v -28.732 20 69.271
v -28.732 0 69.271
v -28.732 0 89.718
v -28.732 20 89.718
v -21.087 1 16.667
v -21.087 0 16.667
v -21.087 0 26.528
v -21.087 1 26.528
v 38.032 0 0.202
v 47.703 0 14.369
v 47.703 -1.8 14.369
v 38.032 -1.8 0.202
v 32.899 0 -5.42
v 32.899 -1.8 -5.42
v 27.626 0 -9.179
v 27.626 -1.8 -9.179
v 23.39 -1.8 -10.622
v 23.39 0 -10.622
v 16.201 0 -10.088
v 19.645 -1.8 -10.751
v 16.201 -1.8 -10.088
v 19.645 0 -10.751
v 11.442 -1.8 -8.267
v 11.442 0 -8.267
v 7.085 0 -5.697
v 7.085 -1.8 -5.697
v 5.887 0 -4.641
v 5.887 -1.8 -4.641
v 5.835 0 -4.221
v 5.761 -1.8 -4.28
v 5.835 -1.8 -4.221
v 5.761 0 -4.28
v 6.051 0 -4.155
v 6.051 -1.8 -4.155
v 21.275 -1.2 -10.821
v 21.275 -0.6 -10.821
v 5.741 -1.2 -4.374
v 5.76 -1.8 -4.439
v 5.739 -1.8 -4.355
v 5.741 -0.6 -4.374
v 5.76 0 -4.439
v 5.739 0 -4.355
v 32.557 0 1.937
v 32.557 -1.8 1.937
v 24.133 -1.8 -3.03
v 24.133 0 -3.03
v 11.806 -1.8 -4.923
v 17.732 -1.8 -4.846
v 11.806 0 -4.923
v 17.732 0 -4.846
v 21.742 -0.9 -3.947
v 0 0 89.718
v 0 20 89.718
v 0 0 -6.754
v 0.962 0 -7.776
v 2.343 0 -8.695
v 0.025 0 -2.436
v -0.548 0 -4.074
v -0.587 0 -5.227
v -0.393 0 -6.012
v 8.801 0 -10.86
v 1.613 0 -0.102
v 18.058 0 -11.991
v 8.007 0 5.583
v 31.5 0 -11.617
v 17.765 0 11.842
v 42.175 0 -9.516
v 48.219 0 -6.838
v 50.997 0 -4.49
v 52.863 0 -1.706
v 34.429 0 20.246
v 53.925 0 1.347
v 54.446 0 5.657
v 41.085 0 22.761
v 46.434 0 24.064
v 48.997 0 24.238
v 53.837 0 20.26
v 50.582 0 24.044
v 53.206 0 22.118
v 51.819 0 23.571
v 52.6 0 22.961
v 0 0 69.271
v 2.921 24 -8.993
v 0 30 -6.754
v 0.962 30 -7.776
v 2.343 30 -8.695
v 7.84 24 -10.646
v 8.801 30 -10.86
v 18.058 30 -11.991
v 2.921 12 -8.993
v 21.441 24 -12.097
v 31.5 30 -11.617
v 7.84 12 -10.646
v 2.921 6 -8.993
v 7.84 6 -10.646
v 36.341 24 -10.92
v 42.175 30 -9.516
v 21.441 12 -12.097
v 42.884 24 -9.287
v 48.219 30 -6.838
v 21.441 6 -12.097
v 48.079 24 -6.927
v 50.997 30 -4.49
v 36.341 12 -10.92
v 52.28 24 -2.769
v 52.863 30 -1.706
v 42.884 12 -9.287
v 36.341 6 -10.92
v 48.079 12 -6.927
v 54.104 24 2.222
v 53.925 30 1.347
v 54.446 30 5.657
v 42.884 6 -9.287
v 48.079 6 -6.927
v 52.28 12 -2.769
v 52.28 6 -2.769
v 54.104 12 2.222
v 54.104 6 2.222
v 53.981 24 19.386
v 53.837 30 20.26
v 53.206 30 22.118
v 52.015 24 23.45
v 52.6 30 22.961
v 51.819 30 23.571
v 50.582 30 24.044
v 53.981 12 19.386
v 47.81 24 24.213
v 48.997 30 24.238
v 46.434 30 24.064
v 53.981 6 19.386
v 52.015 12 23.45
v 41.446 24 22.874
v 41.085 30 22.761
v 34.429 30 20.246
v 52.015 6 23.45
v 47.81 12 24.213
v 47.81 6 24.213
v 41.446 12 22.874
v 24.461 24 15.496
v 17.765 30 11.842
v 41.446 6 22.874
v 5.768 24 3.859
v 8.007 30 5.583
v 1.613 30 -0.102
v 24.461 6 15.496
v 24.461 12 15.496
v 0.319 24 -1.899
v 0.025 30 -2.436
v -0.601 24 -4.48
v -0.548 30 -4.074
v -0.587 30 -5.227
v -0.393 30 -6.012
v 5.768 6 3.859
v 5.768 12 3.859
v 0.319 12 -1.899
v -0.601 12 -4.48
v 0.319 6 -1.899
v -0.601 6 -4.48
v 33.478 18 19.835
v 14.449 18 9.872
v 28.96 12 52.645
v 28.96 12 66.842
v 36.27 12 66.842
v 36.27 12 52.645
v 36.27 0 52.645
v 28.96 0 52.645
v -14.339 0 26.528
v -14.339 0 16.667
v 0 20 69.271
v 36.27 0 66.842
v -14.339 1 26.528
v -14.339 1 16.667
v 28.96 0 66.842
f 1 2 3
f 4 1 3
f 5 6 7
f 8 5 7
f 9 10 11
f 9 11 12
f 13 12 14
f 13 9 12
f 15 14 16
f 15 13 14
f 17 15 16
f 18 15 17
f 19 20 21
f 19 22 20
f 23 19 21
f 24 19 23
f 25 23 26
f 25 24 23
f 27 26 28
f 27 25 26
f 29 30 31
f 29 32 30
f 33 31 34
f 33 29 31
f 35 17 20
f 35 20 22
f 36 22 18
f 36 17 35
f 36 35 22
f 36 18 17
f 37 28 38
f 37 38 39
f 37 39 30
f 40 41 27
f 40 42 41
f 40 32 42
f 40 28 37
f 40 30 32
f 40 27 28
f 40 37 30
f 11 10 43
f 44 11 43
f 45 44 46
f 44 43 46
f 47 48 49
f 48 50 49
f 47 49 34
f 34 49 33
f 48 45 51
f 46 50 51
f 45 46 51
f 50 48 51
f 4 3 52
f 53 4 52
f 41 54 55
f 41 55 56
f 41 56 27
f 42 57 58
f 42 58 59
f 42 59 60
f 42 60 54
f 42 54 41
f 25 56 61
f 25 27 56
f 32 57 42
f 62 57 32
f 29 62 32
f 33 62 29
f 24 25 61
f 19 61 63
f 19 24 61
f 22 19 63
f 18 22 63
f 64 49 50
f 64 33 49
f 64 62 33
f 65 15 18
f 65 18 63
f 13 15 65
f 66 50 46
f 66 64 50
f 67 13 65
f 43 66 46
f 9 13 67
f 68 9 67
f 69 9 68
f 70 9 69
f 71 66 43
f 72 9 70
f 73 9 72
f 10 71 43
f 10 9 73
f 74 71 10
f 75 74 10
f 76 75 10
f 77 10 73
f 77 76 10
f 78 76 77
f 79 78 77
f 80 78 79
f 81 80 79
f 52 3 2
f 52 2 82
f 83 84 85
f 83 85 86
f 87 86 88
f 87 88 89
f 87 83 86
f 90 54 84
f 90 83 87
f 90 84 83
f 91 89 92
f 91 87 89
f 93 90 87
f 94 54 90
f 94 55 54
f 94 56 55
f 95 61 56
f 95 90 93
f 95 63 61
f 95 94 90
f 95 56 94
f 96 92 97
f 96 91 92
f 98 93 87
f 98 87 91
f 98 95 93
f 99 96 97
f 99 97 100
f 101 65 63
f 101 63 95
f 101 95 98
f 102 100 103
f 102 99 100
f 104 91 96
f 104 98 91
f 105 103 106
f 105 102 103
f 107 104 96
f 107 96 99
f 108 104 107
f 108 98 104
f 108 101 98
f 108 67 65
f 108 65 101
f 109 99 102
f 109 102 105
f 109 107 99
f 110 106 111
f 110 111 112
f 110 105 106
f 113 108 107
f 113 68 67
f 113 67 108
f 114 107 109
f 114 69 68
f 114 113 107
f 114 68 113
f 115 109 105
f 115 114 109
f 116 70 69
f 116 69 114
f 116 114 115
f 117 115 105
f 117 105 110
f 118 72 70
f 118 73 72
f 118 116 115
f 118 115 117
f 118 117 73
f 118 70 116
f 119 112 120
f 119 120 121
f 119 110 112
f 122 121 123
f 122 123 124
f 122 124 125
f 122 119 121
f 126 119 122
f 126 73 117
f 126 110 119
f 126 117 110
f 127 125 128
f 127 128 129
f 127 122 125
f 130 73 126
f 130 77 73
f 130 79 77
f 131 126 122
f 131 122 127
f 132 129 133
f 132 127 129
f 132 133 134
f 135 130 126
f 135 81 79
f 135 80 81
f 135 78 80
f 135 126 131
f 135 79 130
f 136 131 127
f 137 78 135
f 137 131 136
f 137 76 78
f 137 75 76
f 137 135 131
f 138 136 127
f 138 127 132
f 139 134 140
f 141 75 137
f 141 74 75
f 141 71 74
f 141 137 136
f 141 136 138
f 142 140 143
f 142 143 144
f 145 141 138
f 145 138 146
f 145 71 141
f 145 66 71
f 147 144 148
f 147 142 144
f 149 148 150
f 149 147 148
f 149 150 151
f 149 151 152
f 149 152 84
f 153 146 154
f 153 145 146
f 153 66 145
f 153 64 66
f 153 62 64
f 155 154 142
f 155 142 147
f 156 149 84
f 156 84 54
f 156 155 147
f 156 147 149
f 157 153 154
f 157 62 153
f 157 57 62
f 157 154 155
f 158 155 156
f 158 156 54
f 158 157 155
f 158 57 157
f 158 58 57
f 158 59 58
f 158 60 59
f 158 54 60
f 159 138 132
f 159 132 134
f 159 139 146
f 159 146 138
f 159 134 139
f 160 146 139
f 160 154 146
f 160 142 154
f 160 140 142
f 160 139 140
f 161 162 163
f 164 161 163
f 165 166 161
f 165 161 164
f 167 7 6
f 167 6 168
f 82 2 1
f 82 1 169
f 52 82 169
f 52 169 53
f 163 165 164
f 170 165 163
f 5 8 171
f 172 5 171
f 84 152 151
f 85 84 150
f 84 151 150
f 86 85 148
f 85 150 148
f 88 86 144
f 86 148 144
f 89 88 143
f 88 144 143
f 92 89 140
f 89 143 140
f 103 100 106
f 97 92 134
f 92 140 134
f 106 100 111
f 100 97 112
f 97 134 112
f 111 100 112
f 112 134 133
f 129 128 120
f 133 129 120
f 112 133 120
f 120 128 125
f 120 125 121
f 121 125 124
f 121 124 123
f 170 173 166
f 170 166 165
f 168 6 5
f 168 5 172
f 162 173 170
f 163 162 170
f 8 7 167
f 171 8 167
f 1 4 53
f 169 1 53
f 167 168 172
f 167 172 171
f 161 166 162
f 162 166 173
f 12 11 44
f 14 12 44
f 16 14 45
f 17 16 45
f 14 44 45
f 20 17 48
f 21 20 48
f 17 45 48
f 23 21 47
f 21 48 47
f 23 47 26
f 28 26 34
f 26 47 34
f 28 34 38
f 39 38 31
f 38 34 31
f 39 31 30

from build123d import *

# Parameters (mm, degrees)
F1_DEPTH  = 30
F2_W      = 28.7323128432
F2_H      = 20.4472616315
F3_DEPTH  = 20
F4_W      = 7.3102321476
F4_H      = 14.1971670091
F5_DEPTH  = 12
F6_W      = 6.7479042336
F6_H      = 9.8608862609
F7_DEPTH  = 1
F12_DEPTH = 1.8


# Not quite as in the source:
# - the program builds the solid bodies; features that only make, move or delete a surface that nothing else refers to are left out


with BuildPart() as f1:
    # F0 (on Front) → F1 (new body)
    with BuildSketch(Plane.XZ):
        with BuildLine():
            add(Edge.make_bspline(
                [(0, -6.7537389696), (4.6302731937, -13.4867750862), (57.4556467963, -14.6892854363), (53.6464783261, 12.0488052166), (54.9550616853, 28.5506433284), (24.9504990775, 17.5929765935), (-3.8399352956, -1.1699597951), (0, -6.7537389696)],
                knots=[0, 0, 0, 0, 0.2678904064, 0.4437728792, 0.5709352547, 0.7778356084, 1, 1, 1, 1], degree=3))
        make_face()
    extrude(amount=-F1_DEPTH)

    # F11 (on face) → F12 (join)
    with BuildSketch(Plane.XZ):
        with BuildLine():
            add(Edge.make_bspline(
                [(47.7026514709, 14.3687073141), (39.7348380228, 1.8481294782), (26.3590902699, -19.1704463134), (4.6243785504, -4.4828704433), (5.8864211069, -4.1930439331), (6.0512563214, -4.1551897302)],
                knots=[0, 0, 0, 0, 0.5615806693, 0.9427381081, 1, 1, 1, 1], degree=3))
            add(Edge.make_bspline(
                [(47.7026514709, 14.3687073141), (38.6932003586, 6.4997414698), (23.3521508086, -6.8993206285), (11.1056602211, -4.956879257), (6.0512563214, -4.1551897302)],
                knots=[0, 0, 0, 0, 0.5872773621, 1, 1, 1, 1], degree=3))
        make_face()
    extrude(amount=F12_DEPTH)


with BuildPart() as f3:
    # F2 (on Front) → F3 (new body)
    with BuildSketch(Plane.XZ):
        with Locations((-14.3661564216, 79.4941745698)):
            Rectangle(F2_W, F2_H)
    extrude(amount=-F3_DEPTH)


with BuildPart() as f5:
    # F4 (on Front) → F5 (new body)
    with BuildSketch(Plane.XZ):
        with Locations((32.6148914173, 59.7432572395)):
            Rectangle(F4_W, F4_H)
    extrude(amount=-F5_DEPTH)


with BuildPart() as f7:
    # F6 (on Front) → F7 (new body)
    with BuildSketch(Plane.XZ):
        with Locations((-17.7132585086, 21.5970976278)):
            Rectangle(F6_W, F6_H)
    extrude(amount=-F7_DEPTH)


solid = Compound([f1.part, f3.part, f5.part, f7.part])
